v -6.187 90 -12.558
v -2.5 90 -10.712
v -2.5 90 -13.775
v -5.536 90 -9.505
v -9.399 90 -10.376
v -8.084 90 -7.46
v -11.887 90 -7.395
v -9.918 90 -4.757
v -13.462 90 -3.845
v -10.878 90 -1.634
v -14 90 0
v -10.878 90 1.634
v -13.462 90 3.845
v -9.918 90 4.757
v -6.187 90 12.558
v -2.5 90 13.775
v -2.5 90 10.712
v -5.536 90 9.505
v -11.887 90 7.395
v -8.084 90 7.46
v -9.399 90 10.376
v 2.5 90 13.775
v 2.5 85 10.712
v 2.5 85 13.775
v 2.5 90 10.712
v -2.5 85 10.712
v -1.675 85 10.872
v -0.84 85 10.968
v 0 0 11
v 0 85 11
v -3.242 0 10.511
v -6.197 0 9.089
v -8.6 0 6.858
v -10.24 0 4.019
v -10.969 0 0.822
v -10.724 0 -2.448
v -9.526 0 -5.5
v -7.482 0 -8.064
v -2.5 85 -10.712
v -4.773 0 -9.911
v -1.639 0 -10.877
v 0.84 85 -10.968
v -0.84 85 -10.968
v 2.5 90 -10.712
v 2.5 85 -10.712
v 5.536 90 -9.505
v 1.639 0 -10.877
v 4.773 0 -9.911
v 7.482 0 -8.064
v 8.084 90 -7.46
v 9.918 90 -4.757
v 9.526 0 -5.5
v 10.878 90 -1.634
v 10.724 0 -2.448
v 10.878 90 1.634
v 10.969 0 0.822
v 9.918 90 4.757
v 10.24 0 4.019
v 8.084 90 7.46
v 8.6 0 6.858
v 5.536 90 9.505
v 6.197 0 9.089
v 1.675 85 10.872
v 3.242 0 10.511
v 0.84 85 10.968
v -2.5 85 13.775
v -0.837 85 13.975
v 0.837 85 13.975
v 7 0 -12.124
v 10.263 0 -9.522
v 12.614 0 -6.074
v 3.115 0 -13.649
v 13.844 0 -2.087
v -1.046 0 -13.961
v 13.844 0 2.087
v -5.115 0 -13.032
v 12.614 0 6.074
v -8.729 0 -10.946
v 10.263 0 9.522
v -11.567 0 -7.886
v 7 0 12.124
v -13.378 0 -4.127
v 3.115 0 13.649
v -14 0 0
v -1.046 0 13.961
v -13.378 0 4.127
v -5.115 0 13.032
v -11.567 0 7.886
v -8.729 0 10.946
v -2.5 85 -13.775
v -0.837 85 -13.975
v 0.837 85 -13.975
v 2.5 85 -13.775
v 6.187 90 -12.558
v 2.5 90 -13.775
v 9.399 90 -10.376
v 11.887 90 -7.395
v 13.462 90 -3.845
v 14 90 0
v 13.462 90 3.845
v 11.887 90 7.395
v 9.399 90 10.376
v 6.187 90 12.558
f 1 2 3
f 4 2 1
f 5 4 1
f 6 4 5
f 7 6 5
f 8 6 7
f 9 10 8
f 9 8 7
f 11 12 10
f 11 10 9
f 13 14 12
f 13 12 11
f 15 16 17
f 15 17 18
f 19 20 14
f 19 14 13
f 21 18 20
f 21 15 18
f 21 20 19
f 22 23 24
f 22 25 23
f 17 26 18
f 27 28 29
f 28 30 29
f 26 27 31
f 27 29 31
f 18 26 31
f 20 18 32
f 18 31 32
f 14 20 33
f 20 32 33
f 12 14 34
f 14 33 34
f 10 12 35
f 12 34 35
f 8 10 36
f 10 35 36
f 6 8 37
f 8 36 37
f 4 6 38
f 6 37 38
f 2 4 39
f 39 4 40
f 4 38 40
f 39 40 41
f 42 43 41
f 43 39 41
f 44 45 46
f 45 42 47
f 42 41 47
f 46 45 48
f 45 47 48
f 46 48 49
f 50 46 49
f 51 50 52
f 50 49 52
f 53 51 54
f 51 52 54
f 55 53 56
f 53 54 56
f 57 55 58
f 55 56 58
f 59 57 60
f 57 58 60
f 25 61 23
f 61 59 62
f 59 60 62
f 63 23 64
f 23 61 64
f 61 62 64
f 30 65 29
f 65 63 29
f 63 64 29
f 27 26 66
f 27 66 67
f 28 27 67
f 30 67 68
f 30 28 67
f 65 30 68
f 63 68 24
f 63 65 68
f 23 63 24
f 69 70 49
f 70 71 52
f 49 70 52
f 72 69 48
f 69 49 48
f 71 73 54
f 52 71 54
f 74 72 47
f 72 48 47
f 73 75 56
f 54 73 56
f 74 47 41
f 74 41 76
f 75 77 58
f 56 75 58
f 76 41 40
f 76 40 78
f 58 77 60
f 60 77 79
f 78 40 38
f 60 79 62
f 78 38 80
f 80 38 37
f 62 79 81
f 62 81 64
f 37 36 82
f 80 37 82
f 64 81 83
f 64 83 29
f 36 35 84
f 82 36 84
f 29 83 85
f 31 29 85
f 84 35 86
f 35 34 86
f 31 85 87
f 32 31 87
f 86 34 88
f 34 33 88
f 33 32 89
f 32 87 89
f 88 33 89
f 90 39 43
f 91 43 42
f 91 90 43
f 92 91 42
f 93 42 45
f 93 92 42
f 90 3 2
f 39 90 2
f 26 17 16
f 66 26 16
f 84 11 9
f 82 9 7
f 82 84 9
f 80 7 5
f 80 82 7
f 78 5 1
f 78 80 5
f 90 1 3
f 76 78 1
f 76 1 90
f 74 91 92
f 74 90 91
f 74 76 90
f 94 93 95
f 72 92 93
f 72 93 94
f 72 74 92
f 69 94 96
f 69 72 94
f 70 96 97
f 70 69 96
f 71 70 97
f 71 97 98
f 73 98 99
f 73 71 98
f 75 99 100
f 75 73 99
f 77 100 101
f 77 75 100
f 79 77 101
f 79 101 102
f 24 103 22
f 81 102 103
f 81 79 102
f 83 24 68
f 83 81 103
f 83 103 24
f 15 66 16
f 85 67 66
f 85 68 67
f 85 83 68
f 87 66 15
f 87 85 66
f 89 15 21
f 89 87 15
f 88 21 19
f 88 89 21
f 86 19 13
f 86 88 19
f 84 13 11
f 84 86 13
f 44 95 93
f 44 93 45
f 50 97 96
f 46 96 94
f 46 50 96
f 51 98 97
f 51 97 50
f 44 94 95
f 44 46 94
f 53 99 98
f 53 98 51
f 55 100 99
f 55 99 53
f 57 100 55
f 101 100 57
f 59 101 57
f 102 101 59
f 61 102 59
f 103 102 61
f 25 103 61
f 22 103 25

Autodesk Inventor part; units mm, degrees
ref_plane "YZ Plane" through (0, 0, 0) normal (1, 0, 0) x (0, 1, 0)
ref_plane "XZ Plane" through (0, 0, 0) normal (0, 1, 0) x (-1, 0, 0)
ref_plane "XY Plane" through (0, 0, 0) normal (0, 0, 1) x (1, 0, 0)
sketch "Sketch1" plane through (0, 0, 0) normal (0, 1, 0) x (-1, 0, 0)
  point P0 (0, 0)
sketch "Sketch2" plane through (0, 0, 0) normal (0, 1, 0) x (-1, 0, 0)
  circle A0 centre (0, 0) radius 11
  circle A1 centre (0, 0) radius 14
  dimension "d0" = 22
  dimension "d1" = 28
extrude "Extrusion1" add sketch "Sketch2" along normal blind 90 contours A0 | A1
hole "Hole1" at (0, 90, 0) direction (0, -1, 0) diameter 22 depth 90 tip angle 118
sketch "Sketch3" plane through (0, 90, 0) normal (0, 1, 0) x (1, 0, 0)
  circle A0 centre (0, 0) radius 11 projected
  circle A1 centre (0, 0) radius 14 projected
  line L0 (2.5, 13.775) -> (2.5, 10.7121)
  line L1 (-2.5, 13.775) -> (-2.5, 10.7121)
  line L2 (-2.5, -10.7121) -> (-2.5, -13.775)
  line L3 (2.5, -10.7121) -> (2.5, -13.775)
extrude "Extrusion2" cut sketch "Sketch3" against normal blind 5 contours L3 A1 L2 A0
sketch "Sketch4" plane through (0, 90, 0) normal (0, 1, 0) x (1, 0, 0)
  arc A0 (2.5, -10.7121) -> (-2.5, -10.7121) centre (0, 0) ccw projected
  circle A1 centre (0, 0) radius 14 projected
  line L0 (-2.5, 13.775) -> (-2.5, 10.7121)
  circle A2 centre (0, 0) radius 11 projected
  line L1 (2.5, 13.775) -> (2.5, 10.7121)
sketch "Sketch5" plane through (0, 90, 0) normal (0, 1, 0) x (1, 0, 0)
  point P0 (0, 0)
sketch "Sketch6" plane through (0, 90, 0) normal (0, 1, 0) x (1, 0, 0)
  point P0 (0, 0)
extrude "Extrusion3" cut sketch "Sketch4" against normal blind 5 contours A0 L0 A1 L1
sketch "Sketch7" plane through (0, 90, 0) normal (0, 1, 0) x (1, 0, 0)
  point P0 (0, 0)
  point P1 (-2.4887, 10.7148)
  point P2 (2.5, 10.7121)
sketch "Sketch8" plane through (0, 0, 0) normal (0, 1, 0) x (-1, 0, 0)
  arc A0 (2.5, -10.7121) -> (-2.5, -10.7121) centre (0, 0) ccw
sketch "Sketch9" plane through (0, 85, 0) normal (0, 1, 0) x (1, 0, 0)
  arc A0 (-2.5, 13.775) -> (-2.5, -13.775) centre (0, 0) ccw projected
  line L0 (-14, 0) -> (14.5387, 0)
properties part number "pusher"
